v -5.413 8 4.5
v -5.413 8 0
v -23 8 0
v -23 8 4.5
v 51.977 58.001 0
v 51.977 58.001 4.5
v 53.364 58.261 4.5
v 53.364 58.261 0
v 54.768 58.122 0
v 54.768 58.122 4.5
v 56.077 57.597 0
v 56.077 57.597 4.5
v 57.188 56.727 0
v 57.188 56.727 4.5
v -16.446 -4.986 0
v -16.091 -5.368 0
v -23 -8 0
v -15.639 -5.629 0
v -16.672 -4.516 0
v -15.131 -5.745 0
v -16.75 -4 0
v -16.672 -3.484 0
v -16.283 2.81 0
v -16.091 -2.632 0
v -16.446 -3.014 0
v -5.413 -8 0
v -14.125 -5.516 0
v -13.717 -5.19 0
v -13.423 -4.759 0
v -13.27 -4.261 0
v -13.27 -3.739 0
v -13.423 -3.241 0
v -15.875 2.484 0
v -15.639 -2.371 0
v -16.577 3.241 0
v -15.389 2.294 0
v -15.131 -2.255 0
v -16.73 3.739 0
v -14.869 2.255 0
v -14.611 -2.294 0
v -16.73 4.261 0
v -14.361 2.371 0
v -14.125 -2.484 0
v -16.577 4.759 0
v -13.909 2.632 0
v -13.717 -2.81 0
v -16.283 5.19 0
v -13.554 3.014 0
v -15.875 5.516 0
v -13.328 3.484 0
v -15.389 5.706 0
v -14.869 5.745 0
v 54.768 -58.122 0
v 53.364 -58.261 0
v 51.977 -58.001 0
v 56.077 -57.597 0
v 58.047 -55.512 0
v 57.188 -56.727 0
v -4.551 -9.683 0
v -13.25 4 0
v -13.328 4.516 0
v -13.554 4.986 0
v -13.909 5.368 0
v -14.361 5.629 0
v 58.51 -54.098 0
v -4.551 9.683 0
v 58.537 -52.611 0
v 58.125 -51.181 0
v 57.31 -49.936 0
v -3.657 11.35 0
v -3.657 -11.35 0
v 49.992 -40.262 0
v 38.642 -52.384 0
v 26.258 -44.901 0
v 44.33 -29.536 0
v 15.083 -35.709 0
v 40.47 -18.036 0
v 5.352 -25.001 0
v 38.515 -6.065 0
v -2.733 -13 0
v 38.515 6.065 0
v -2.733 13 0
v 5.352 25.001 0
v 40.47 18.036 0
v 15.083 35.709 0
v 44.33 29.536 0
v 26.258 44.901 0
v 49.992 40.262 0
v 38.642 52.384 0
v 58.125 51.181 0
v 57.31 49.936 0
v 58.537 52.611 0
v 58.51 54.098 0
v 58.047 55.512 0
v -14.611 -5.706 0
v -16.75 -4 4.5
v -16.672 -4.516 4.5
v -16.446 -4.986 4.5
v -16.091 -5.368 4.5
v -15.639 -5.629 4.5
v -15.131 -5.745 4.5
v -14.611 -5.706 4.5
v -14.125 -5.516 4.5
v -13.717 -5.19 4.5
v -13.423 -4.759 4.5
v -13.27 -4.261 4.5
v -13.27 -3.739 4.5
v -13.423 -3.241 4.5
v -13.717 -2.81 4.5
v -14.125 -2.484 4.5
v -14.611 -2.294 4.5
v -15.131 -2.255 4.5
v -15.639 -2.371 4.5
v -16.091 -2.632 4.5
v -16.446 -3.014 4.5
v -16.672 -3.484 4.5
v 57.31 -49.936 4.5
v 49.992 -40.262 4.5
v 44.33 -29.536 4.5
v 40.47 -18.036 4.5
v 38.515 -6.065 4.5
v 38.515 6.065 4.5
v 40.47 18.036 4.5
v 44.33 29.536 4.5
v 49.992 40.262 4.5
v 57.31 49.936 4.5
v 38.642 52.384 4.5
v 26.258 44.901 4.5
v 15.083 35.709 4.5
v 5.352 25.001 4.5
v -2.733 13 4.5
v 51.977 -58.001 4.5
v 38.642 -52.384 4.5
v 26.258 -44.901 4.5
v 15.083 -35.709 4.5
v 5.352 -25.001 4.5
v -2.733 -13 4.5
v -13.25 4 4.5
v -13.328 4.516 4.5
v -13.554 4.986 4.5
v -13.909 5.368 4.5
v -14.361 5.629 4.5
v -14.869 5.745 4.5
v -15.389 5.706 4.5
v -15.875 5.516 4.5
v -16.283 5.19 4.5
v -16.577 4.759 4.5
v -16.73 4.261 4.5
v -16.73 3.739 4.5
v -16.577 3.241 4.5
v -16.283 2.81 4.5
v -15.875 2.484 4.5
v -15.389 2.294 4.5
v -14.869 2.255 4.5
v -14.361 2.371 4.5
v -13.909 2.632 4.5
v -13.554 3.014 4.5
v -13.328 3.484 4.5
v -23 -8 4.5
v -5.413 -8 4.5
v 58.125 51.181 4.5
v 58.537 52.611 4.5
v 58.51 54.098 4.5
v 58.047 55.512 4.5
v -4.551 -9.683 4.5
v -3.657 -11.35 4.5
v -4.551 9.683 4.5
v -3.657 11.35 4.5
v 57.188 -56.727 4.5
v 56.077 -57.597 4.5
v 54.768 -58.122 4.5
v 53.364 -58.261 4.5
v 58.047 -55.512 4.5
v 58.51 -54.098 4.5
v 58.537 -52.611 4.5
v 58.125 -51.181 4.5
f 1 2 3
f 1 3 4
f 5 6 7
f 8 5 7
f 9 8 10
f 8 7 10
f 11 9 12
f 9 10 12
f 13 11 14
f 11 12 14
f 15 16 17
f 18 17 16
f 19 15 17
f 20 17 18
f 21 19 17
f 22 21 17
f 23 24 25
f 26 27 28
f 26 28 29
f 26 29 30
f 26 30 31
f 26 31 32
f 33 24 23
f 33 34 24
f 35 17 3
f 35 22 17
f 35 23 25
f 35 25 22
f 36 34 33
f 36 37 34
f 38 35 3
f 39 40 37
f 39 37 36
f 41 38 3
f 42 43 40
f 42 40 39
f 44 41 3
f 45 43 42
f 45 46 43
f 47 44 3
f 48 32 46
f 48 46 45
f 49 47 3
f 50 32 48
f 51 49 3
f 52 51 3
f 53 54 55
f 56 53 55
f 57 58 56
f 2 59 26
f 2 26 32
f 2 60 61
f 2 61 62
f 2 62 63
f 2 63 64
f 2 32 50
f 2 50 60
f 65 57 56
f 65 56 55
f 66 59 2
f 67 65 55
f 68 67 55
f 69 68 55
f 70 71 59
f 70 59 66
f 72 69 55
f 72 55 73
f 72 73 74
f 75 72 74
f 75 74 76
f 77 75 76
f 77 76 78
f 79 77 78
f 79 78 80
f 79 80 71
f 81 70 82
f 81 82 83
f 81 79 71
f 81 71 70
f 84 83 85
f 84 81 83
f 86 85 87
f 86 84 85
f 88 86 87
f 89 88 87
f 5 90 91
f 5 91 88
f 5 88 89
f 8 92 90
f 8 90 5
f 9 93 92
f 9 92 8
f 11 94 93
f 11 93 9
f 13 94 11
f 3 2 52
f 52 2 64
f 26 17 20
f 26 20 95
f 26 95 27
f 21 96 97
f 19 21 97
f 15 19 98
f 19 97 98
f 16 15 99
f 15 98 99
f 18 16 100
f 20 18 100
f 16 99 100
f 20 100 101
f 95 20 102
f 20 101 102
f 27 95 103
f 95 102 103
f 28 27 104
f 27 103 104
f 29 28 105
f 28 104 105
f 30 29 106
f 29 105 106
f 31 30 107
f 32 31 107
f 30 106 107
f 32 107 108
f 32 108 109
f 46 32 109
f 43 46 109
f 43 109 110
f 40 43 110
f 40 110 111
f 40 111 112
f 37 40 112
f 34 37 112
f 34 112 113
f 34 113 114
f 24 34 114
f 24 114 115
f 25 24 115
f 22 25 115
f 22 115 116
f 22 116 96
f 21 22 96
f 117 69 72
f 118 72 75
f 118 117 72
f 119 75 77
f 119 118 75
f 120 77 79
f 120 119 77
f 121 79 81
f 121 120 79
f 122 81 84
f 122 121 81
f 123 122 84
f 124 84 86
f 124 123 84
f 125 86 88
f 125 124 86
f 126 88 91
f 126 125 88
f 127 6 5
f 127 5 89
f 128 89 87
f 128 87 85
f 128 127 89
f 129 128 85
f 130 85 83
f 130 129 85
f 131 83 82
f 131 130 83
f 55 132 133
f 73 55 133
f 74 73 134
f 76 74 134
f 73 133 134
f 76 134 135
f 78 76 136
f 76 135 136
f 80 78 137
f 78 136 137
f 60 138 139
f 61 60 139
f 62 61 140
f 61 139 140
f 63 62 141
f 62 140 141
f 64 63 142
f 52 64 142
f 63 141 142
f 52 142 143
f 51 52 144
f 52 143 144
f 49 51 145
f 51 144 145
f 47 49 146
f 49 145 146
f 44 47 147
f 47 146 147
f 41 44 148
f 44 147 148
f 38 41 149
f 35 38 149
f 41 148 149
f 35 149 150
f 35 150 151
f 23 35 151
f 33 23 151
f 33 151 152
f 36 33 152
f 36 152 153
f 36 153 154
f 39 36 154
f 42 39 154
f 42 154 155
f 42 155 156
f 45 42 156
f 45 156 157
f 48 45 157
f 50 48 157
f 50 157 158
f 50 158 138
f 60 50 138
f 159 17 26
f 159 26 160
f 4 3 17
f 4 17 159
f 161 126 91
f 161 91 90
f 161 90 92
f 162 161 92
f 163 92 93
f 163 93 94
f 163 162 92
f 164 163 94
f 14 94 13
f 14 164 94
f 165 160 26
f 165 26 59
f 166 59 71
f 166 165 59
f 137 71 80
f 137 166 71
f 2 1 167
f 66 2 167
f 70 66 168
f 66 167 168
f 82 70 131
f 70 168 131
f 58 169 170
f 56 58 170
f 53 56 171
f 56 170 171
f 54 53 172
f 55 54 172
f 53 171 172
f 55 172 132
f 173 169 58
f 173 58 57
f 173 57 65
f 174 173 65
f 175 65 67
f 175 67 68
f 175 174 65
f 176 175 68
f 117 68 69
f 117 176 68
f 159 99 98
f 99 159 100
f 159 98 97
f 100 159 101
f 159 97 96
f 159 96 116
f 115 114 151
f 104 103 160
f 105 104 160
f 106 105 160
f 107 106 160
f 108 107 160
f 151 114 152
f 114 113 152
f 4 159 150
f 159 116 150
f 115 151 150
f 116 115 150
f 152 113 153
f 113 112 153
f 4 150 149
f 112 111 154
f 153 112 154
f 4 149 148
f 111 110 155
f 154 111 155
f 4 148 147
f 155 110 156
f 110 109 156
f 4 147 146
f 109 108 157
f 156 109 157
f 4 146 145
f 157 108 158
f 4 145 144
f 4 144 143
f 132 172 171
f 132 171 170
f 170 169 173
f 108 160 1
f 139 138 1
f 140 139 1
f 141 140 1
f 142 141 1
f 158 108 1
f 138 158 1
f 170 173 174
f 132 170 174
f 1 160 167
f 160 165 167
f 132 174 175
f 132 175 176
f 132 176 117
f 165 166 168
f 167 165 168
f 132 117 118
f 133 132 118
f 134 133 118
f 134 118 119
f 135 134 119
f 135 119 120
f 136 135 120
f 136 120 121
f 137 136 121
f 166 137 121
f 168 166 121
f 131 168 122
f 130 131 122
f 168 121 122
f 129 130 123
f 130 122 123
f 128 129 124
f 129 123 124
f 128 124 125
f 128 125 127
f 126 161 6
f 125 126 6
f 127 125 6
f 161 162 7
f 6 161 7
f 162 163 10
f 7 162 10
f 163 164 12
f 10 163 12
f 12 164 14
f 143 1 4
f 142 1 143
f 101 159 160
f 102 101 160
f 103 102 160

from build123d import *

# Parameters (mm, degrees)
EXTRUDE_1_DEPTH             = 4.5
SKETCH_2_R                  = 1.25
CUT_EXTRUDE_1_DEPTH         = 10
SKETCH_3_W                  = 12
SKETCH_3_H                  = 2
CUT_EXTRUDE_2_DEPTH         = 10
SKETCH_4_W                  = 13
SKETCH_4_H                  = 30
EXTRUDE_2_DEPTH             = 4
SKETCH_5_W                  = 13
SKETCH_5_H                  = 30
EXTRUDE_3_DEPTH             = 4
SKETCH_6_W                  = 13
SKETCH_6_H                  = 12.5
EXTRUDE_4_DEPTH             = 3
EXTRUDE_5_REACH             = 94.407
EXTRUDE_5_DIRECTION_2_REACH = 94.407
CUT_EXTRUDE_3_DEPTH         = 3
CUT_EXTRUDE_3_DEPTH_BACK    = 10.5
SKETCH_14_W                 = 13
SKETCH_14_H                 = 30
CUT_EXTRUDE_6_DEPTH         = 30
SKETCH_16_W                 = 13
SKETCH_16_H                 = 30
EXTRUDE_6_DEPTH             = 4.5
CUT_EXTRUDE_7_DEPTH         = 30
EXTRUDE_7_DEPTH             = 1
EXTRUDE_7_DEPTH_BACK        = 12
SKETCH_19_RX                = 16
SKETCH_19_RY                = 9
SKETCH_20_W                 = 4.5
SKETCH_20_H                 = 16.5
CUT_EXTRUDE_8_DEPTH         = 10.5
SKETCH_21_RX                = 19
SKETCH_21_RY                = 12
SKETCH_21_RX_2              = 16
SKETCH_21_RY_2              = 9
EXTRUDE_8_DEPTH             = 5
EXTRUDE_9_DEPTH             = 4.5
SKETCH_24_RX                = 22.349362986
SKETCH_24_RY                = 16.698081898
SKETCH_24_RX_2              = 16
SKETCH_24_RY_2              = 9
CUT_EXTRUDE_9_DEPTH         = 1
EXTRUDE_10_DEPTH            = 2
EXTRUDE_11_DEPTH            = 2
FILLET_2_R                  = 5
EXTRUDE_START               = -4.5
EXTRUDE_12_DEPTH            = 4.5
CUT_EXTRUDE_START           = -10
CUT_EXTRUDE_10_DEPTH        = 10
FILLET_3_R                  = 5
SKETCH_31_R                 = 27.637310688
CUT_EXTRUDE_11_DEPTH        = 11
SKETCH_32_W                 = 10.592360953
SKETCH_32_H                 = 40.503930122
SKETCH_32_W_2               = 11.438719886
CUT_EXTRUDE_12_DEPTH        = 10
CUT_EXTRUDE_13_DEPTH        = 10
SKETCH_34_W                 = 4.5
SKETCH_34_H                 = 40.503930122
EXTRUDE_14_DEPTH            = 20
CUT_EXTRUDE_14_DEPTH        = 15
CUT_EXTRUDE_16_DEPTH        = 10
EXTRUDE_15_DEPTH            = 4.5
CUT_EXTRUDE_17_DEPTH        = 10
SKETCH_45_W                 = 4.5
SKETCH_45_H                 = 16
EXTRUDE_17_DEPTH            = 9
SKETCH_46_R                 = 1.75
CUT_EXTRUDE_18_DEPTH        = 83.744717158


with BuildPart() as part:
    # 草图1 → 凸台-拉伸1 (new body)
    with BuildSketch(Plane.XY):
        with BuildLine():
            Line((6, 12), (37.748517734, 60))
            ThreePointArc((37.748517734, 60), (70, 0), (37.748517734, -60))
            Line((37.748517734, -60), (6, -12))
            Line((6, -12), (-6, -12))
            Line((-6, -12), (-6, 12))
            Line((-6, 12), (6, 12))
        make_face()
    extrude(amount=EXTRUDE_1_DEPTH)

    # 草图2 → 切除-拉伸1 (cut)
    with BuildSketch(Plane.XY.offset(4.5)):
        with Locations((0, 5)):
            Circle(SKETCH_2_R)
        with Locations((0, -5)):
            Circle(SKETCH_2_R)
    extrude(amount=-CUT_EXTRUDE_1_DEPTH, mode=Mode.SUBTRACT)

    # 草图3 → 切除-拉伸2 (cut)
    with BuildSketch(Plane.XY.offset(4.5)):
        with Locations((0, 11)):
            Rectangle(SKETCH_3_W, SKETCH_3_H)
        with Locations((0, -11)):
            Rectangle(SKETCH_3_W, SKETCH_3_H)
    extrude(amount=-CUT_EXTRUDE_2_DEPTH, mode=Mode.SUBTRACT)

    # 草图4 → 凸台-拉伸2 (add)
    with BuildSketch(Plane.XY.offset(4.5)):
        with Locations((2.5, 0)):
            Rectangle(SKETCH_4_W, SKETCH_4_H)
    extrude(amount=EXTRUDE_2_DEPTH)

    # 草图5 → 凸台-拉伸3 (add)
    with BuildSketch(Plane(origin=(0, 0, 0), x_dir=(-1, 0, 0), z_dir=(0, 0, -1))):
        with Locations((-2.5, 0)):
            Rectangle(SKETCH_5_W, SKETCH_5_H)
    extrude(amount=EXTRUDE_3_DEPTH)

    # 草图6 → 凸台-拉伸4 (add)
    with BuildSketch(Plane(origin=(0, 15, 0), x_dir=(1, 0, 0), z_dir=(0, 1, 0))):
        with Locations((2.5, -2.25)):
            Rectangle(SKETCH_6_W, SKETCH_6_H)
    extrude_4 = extrude(amount=-EXTRUDE_4_DEPTH)

    # 镜向1: 凸台-拉伸4 across plane
    add(extrude_4.mirror(Plane.ZX))

    # 凸台-拉伸5: up to this face of the body (flat: up to its plane)
    extrude_5_end = Plane(part.part.faces().sort_by_distance((39.824869212, 0, 4.5))[0])
    # 草图8 → 凸台-拉伸5 (add, up to the picked face)
    with BuildSketch(Plane.XY.offset(2.25), mode=Mode.PRIVATE) as extrude_5_sk1:
        Polygon((-4, 15), (37.748517734, 60), (7.984282358, 15), align=None)
    extrude_5_tool1 = split(extrude(extrude_5_sk1.sketch, amount=EXTRUDE_5_REACH, mode=Mode.PRIVATE), bisect_by=extrude_5_end, keep=Keep.BOTH, mode=Mode.PRIVATE)
    extrude_5 = extrude_5_tool1.solids().sort_by(Axis((13.910933, 30, 2.25), (0, 0, 1)))[0]
    add(extrude_5)

    # 凸台-拉伸5 direction 2: up to this face of the body (flat: up to its plane)
    extrude_5_direction_2_end = Plane(part.part.faces().sort_by_distance((39.824869212, 0, 0))[0])
    # 草图8 → 凸台-拉伸5 direction 2 (add, up to the picked face)
    with BuildSketch(Plane.XY.offset(2.25), mode=Mode.PRIVATE) as extrude_5_direction_2_sk1:
        Polygon((-4, 15), (37.748517734, 60), (7.984282358, 15), align=None)
    extrude_5_direction_2_tool1 = split(extrude(extrude_5_direction_2_sk1.sketch, amount=-EXTRUDE_5_DIRECTION_2_REACH, mode=Mode.PRIVATE), bisect_by=extrude_5_direction_2_end, keep=Keep.BOTH, mode=Mode.PRIVATE)
    extrude_5_direction_2 = extrude_5_direction_2_tool1.solids().sort_by(Axis((13.910933, 30, 2.25), (0, 0, -1)))[0]
    add(extrude_5_direction_2)

    # 镜向2: 凸台-拉伸5, 凸台-拉伸5 direction 2 across plane
    add(extrude_5.mirror(Plane.ZX))
    add(extrude_5_direction_2.mirror(Plane.ZX))

    # 草图9 → 切除-拉伸3 (cut, two sides: drawn at the far end of the back side and taken through both)
    with BuildSketch(Plane.ZY.offset(4).offset(-CUT_EXTRUDE_3_DEPTH_BACK)):
        Polygon((0, 10), (0, 12), (4.5, 12), (4.5, 10), (4.5, -10), (4.5, -12), (0, -12), (0, -10), align=None)
    extrude(amount=CUT_EXTRUDE_3_DEPTH + CUT_EXTRUDE_3_DEPTH_BACK, mode=Mode.SUBTRACT)

    # 草图14 → 切除-拉伸6 (cut)
    with BuildSketch(Plane.XY.offset(8.5)):
        with Locations((2.5, 0)):
            Rectangle(SKETCH_14_W, SKETCH_14_H)
    extrude(amount=-CUT_EXTRUDE_6_DEPTH, mode=Mode.SUBTRACT)

    # 草图16 → 凸台-拉伸6 (add)
    with BuildSketch(Plane.XY.offset(4.5)):
        with Locations((2.5, 0)):
            Rectangle(SKETCH_16_W, SKETCH_16_H)
    extrude(amount=-EXTRUDE_6_DEPTH)

    # 草图18 → 切除-拉伸7 (cut)
    with BuildSketch(Plane.XY.offset(4.5)):
        Polygon((37.748517734, 60), (6, 15), (-4, 15), align=None)
        Polygon((-4, -15), (37.748517734, -60), (6, -15), align=None)
    extrude(amount=-CUT_EXTRUDE_7_DEPTH, mode=Mode.SUBTRACT)

    # 草图19 → 凸台-拉伸7 (add, two sides: drawn at the far end of the back side and taken through both)
    with BuildSketch(Plane.ZY.offset(4).offset(-EXTRUDE_7_DEPTH_BACK)):
        with Locations(Location((2.25, 0), (0, 0, 90))):
            Ellipse(SKETCH_19_RX, SKETCH_19_RY)
    extrude(amount=EXTRUDE_7_DEPTH + EXTRUDE_7_DEPTH_BACK)

    # 草图20 → 切除-拉伸8 (cut)
    with BuildSketch(Plane.ZY.offset(5)):
        with Locations((2.25, 0)):
            Rectangle(SKETCH_20_W, SKETCH_20_H)
    extrude(amount=-CUT_EXTRUDE_8_DEPTH, mode=Mode.SUBTRACT)

    # 草图21 → 凸台-拉伸8 (add)
    with BuildSketch(Plane.ZY.offset(-5)):
        with Locations(Location((2.25, 0), (0, 0, 90))):
            Ellipse(SKETCH_21_RX, SKETCH_21_RY)
        with Locations(Location((2.25, 0), (0, 0, 90))):
            Ellipse(SKETCH_21_RX_2, SKETCH_21_RY_2, mode=Mode.SUBTRACT)
    extrude(amount=-EXTRUDE_8_DEPTH)

    # 草图23 → 凸台-拉伸9 (add)
    with BuildSketch(Plane.XY.offset(4.5)):
        Polygon((5, 19), (37.748517734, 60), (10, 17.267716944), (5, 17.267716944), align=None)
    extrude_9 = extrude(amount=-EXTRUDE_9_DEPTH)

    # 镜向4: 凸台-拉伸9 across plane
    add(extrude_9.mirror(Plane.ZX))

    # 草图24 → 切除-拉伸9 (cut)
    with BuildSketch(Plane.ZY.offset(-5)):
        with Locations(Location((0, 0), (0, 0, 95.777984299))):
            Ellipse(SKETCH_24_RX, SKETCH_24_RY)
        with Locations(Location((2.25, 0), (0, 0, 90))):
            Ellipse(SKETCH_24_RX_2, SKETCH_24_RY_2, mode=Mode.SUBTRACT)
    extrude(amount=-CUT_EXTRUDE_9_DEPTH, mode=Mode.SUBTRACT)

    # 草图25 → 凸台-拉伸10 (add)
    with BuildSketch(Plane(origin=(8, 0, 0), x_dir=(0, 0, -1), z_dir=(1, 0, 0))):
        with BuildLine():
            Line((-4.5, -15.491933385), (-4.5, 15.491933385))
            add(Edge.make_bspline(
                [(-4.5, 15.491933385), (-11.25, 12.393546708), (-11.25, 0), (-11.25, -12.393546708), (-4.5, -15.491933385)],
                knots=[0.252680255, 0.252680255, 0.252680255, 1.570796327, 1.570796327, 2.888912398, 2.888912398, 2.888912398], degree=2, weights=[1, 0.790569415, 1, 0.790569415, 1]))
        make_face()
    extrude(amount=EXTRUDE_10_DEPTH)

    # 草图26 → 凸台-拉伸11 (add)
    with BuildSketch(Plane(origin=(8, 0, 0), x_dir=(0, 0, -1), z_dir=(1, 0, 0))):
        with BuildLine():
            Line((0, 15.491933385), (0, -15.491933385))
            add(Edge.make_bspline(
                [(0, -15.491933385), (6.75, -12.393546708), (6.75, 0), (6.75, 12.393546708), (0, 15.491933385)],
                knots=[3.394272909, 3.394272909, 3.394272909, 4.71238898, 4.71238898, 6.030505052, 6.030505052, 6.030505052], degree=2, weights=[1, 0.790569415, 1, 0.790569415, 1]))
        make_face()
    extrude(amount=EXTRUDE_11_DEPTH)

    # 圆角2
    fillet_2_edges = [part.edges().sort_by_distance(p)[0] for p in [
        (37.748517734, 60, 2.25),
        (37.748517734, -60, 2.25),
    ]]
    fillet(fillet_2_edges, radius=FILLET_2_R)

    # 草图29 → 凸台-拉伸12 (add)
    with BuildSketch(Plane.XY.offset(4.5).offset(EXTRUDE_START)):
        with BuildLine():
            ThreePointArc((46.097120384, 53.550550283), (63.753039684, 29.321532572), (70, 0))
            Line((70, 0), (80, 0))
            ThreePointArc((80, 0), (73.182189143, 32.722792613), (53.863347086, 60))
            Line((53.863347086, 60), (46.097120384, 53.550550283))
        make_face()
        with BuildLine():
            Line((80, 0), (70, 0))
            ThreePointArc((70, 0), (63.753039684, -29.321532572), (46.097120384, -53.550550283))
            Line((46.097120384, -53.550550283), (53.863347086, -60))
            ThreePointArc((53.863347086, -60), (73.182189143, -32.722792613), (80, 0))
        make_face()
    extrude(amount=EXTRUDE_12_DEPTH)

    # 草图29<3> → 切除-拉伸10 (cut)
    with BuildSketch(Plane.XY.offset(4.5).offset(CUT_EXTRUDE_START)):
        with BuildLine():
            Line((41.159029862, 69.687977685), (6, 20.251965061))
            Line((6, 20.251965061), (34.798527096, 56.306714791))
            ThreePointArc((34.798527096, 56.306714791), (38.095970697, 58.148969105), (41.741126059, 57.159081415))
            ThreePointArc((41.741126059, 57.159081415), (43.954604918, 55.397647146), (46.097120384, 53.550550283))
            Line((46.097120384, 53.550550283), (53.863347086, 60))
            ThreePointArc((53.863347086, 60), (47.747882107, 65.154376737), (41.159029862, 69.687977685))
        make_face()
        with BuildLine():
            Line((53.863347086, -60), (46.097120384, -53.550550283))
            ThreePointArc((46.097120384, -53.550550283), (43.954604918, -55.397647146), (41.741126059, -57.159081415))
            ThreePointArc((41.741126059, -57.159081415), (38.095970697, -58.148969105), (34.798527096, -56.306714791))
            Line((34.798527096, -56.306714791), (6, -20.251965061))
            Line((6, -20.251965061), (41.159029862, -69.687977685))
            ThreePointArc((41.159029862, -69.687977685), (47.747882107, -65.154376737), (53.863347086, -60))
        make_face()
        with BuildLine():
            ThreePointArc((41.741126059, -57.159081415), (43.954604918, -55.397647146), (46.097120384, -53.550550283))
            Line((46.097120384, -53.550550283), (6, -20.251965061))
            Line((6, -20.251965061), (34.798527096, -56.306714791))
            ThreePointArc((34.798527096, -56.306714791), (38.095970697, -58.148969105), (41.741126059, -57.159081415))
        make_face()
        with BuildLine():
            Line((34.798527096, 56.306714791), (6, 20.251965061))
            Line((6, 20.251965061), (46.097120384, 53.550550283))
            ThreePointArc((46.097120384, 53.550550283), (43.954604918, 55.397647146), (41.741126059, 57.159081415))
            ThreePointArc((41.741126059, 57.159081415), (38.095970697, 58.148969105), (34.798527096, 56.306714791))
        make_face()
    extrude(amount=CUT_EXTRUDE_10_DEPTH, mode=Mode.SUBTRACT)

    # 圆角3
    fillet_3_edges = [part.edges().sort_by_distance(p)[0] for p in [
        (53.863347086, 60, 2.25),
        (53.863347086, -60, 2.25),
    ]]
    fillet(fillet_3_edges, radius=FILLET_3_R)

    # 草图31 → 切除-拉伸11 (cut)
    with BuildSketch(Plane.ZY.offset(5)):
        Circle(SKETCH_31_R)
    extrude(amount=-CUT_EXTRUDE_11_DEPTH, mode=Mode.SUBTRACT)

    # 草图32 → 切除-拉伸12 (cut)
    with BuildSketch(Plane.ZY.offset(-6)):
        with Locations((-5.296180477, 0)):
            Rectangle(SKETCH_32_W, SKETCH_32_H)
        with Locations((10.219359943, 0)):
            Rectangle(SKETCH_32_W_2, SKETCH_32_H)
    extrude(amount=-CUT_EXTRUDE_12_DEPTH, mode=Mode.SUBTRACT)

    # 草图33 → 切除-拉伸13 (cut)
    with BuildSketch(Plane(origin=(0, 0, 0), x_dir=(-1, 0, 0), z_dir=(0, 0, -1)).offset(CUT_EXTRUDE_START)):
        with BuildLine():
            ThreePointArc((-57.310429263, 49.936174191), (-58.57903266, 53.35553569), (-57.187792246, 56.726861505))
            ThreePointArc((-57.187792246, 56.726861505), (-80, 0), (-57.187792246, -56.726861505))
            ThreePointArc((-57.187792246, -56.726861505), (-58.57903266, -53.35553569), (-57.310429263, -49.936174191))
            ThreePointArc((-57.310429263, -49.936174191), (-38.269150721, 0), (-57.310429263, 49.936174191))
        make_face()
    extrude(amount=CUT_EXTRUDE_13_DEPTH, mode=Mode.SUBTRACT)

    # 草图34 → 凸台-拉伸14 (add)
    with BuildSketch(Plane.ZY.offset(-6)):
        with Locations((2.25, 0)):
            Rectangle(SKETCH_34_W, SKETCH_34_H)
    extrude(amount=EXTRUDE_14_DEPTH)

    # 草图37 → 切除-拉伸14 (cut)
    with BuildSketch(Plane.XY.offset(4.5)):
        Polygon((-14, 15), (-0.324252934, 15), (6, 20.251965061), (-14, 20.251965061), align=None)
        Polygon((6, -20.251965061), (-0.324252934, -15), (-14, -15), (-14, -20.251965061), align=None)
    extrude(amount=-CUT_EXTRUDE_14_DEPTH, mode=Mode.SUBTRACT)

    # 草图39 → 切除-拉伸16 (cut)
    with BuildSketch(Plane.XY.offset(4.5)):
        Polygon((-0.324252934, 15), (-2.732590713, 13), (-15.121772597, 13), (-15.121772597, 15), align=None)
        Polygon((-15.121772597, -15), (-0.324252934, -15), (-2.732590713, -13), (-15.121772597, -13), align=None)
    extrude(amount=-CUT_EXTRUDE_16_DEPTH, mode=Mode.SUBTRACT)

    # 草图41 → 凸台-拉伸15 (add)
    with BuildSketch(Plane.XY.offset(4.5)):
        with BuildLine():
            ThreePointArc((51.977234617, 58.001456739), (20.503949317, 40.507576232), (-2.732590713, 13))
            Line((-2.732590713, 13), (50.385479815, 57.111811058))
            ThreePointArc((50.385479815, 57.111811058), (51.140457622, 57.629811486), (51.977234617, 58.001456739))
        make_face()
    extrude_15 = extrude(amount=-EXTRUDE_15_DEPTH)

    # 镜向6: 凸台-拉伸15 across plane
    add(extrude_15.mirror(Plane.ZX))

    # 草图42 → 切除-拉伸17 (cut)
    with BuildSketch(Plane.XY.offset(4.5)):
        with BuildLine():
            Line((-14, 13), (-14, 8))
            Line((-14, 8), (-5.412585603, 8))
            ThreePointArc((-5.412585603, 8), (-4.108051236, 10.519008174), (-2.732590713, 13))
            Line((-2.732590713, 13), (-14, 13))
        make_face()
    cut_extrude_17 = extrude(amount=-CUT_EXTRUDE_17_DEPTH, mode=Mode.SUBTRACT)

    # 镜向7: 切除-拉伸17 across plane
    add(cut_extrude_17.mirror(Plane.ZX), mode=Mode.SUBTRACT)

    # 草图45 → 凸台-拉伸17 (add)
    with BuildSketch(Plane.ZY.offset(14)):
        with Locations((2.25, 0)):
            Rectangle(SKETCH_45_W, SKETCH_45_H)
    extrude(amount=EXTRUDE_17_DEPTH)

    # 草图46 → 切除-拉伸18 (cut, through all)
    with BuildSketch(Plane.XY.offset(4.5)):
        with Locations((-15, 4)):
            Circle(SKETCH_46_R)
        with Locations(Location((-15, -4, 0), (0, 0, 180))):
            Circle(SKETCH_46_R)
    extrude(amount=-CUT_EXTRUDE_18_DEPTH, mode=Mode.SUBTRACT)


solid = part.part
